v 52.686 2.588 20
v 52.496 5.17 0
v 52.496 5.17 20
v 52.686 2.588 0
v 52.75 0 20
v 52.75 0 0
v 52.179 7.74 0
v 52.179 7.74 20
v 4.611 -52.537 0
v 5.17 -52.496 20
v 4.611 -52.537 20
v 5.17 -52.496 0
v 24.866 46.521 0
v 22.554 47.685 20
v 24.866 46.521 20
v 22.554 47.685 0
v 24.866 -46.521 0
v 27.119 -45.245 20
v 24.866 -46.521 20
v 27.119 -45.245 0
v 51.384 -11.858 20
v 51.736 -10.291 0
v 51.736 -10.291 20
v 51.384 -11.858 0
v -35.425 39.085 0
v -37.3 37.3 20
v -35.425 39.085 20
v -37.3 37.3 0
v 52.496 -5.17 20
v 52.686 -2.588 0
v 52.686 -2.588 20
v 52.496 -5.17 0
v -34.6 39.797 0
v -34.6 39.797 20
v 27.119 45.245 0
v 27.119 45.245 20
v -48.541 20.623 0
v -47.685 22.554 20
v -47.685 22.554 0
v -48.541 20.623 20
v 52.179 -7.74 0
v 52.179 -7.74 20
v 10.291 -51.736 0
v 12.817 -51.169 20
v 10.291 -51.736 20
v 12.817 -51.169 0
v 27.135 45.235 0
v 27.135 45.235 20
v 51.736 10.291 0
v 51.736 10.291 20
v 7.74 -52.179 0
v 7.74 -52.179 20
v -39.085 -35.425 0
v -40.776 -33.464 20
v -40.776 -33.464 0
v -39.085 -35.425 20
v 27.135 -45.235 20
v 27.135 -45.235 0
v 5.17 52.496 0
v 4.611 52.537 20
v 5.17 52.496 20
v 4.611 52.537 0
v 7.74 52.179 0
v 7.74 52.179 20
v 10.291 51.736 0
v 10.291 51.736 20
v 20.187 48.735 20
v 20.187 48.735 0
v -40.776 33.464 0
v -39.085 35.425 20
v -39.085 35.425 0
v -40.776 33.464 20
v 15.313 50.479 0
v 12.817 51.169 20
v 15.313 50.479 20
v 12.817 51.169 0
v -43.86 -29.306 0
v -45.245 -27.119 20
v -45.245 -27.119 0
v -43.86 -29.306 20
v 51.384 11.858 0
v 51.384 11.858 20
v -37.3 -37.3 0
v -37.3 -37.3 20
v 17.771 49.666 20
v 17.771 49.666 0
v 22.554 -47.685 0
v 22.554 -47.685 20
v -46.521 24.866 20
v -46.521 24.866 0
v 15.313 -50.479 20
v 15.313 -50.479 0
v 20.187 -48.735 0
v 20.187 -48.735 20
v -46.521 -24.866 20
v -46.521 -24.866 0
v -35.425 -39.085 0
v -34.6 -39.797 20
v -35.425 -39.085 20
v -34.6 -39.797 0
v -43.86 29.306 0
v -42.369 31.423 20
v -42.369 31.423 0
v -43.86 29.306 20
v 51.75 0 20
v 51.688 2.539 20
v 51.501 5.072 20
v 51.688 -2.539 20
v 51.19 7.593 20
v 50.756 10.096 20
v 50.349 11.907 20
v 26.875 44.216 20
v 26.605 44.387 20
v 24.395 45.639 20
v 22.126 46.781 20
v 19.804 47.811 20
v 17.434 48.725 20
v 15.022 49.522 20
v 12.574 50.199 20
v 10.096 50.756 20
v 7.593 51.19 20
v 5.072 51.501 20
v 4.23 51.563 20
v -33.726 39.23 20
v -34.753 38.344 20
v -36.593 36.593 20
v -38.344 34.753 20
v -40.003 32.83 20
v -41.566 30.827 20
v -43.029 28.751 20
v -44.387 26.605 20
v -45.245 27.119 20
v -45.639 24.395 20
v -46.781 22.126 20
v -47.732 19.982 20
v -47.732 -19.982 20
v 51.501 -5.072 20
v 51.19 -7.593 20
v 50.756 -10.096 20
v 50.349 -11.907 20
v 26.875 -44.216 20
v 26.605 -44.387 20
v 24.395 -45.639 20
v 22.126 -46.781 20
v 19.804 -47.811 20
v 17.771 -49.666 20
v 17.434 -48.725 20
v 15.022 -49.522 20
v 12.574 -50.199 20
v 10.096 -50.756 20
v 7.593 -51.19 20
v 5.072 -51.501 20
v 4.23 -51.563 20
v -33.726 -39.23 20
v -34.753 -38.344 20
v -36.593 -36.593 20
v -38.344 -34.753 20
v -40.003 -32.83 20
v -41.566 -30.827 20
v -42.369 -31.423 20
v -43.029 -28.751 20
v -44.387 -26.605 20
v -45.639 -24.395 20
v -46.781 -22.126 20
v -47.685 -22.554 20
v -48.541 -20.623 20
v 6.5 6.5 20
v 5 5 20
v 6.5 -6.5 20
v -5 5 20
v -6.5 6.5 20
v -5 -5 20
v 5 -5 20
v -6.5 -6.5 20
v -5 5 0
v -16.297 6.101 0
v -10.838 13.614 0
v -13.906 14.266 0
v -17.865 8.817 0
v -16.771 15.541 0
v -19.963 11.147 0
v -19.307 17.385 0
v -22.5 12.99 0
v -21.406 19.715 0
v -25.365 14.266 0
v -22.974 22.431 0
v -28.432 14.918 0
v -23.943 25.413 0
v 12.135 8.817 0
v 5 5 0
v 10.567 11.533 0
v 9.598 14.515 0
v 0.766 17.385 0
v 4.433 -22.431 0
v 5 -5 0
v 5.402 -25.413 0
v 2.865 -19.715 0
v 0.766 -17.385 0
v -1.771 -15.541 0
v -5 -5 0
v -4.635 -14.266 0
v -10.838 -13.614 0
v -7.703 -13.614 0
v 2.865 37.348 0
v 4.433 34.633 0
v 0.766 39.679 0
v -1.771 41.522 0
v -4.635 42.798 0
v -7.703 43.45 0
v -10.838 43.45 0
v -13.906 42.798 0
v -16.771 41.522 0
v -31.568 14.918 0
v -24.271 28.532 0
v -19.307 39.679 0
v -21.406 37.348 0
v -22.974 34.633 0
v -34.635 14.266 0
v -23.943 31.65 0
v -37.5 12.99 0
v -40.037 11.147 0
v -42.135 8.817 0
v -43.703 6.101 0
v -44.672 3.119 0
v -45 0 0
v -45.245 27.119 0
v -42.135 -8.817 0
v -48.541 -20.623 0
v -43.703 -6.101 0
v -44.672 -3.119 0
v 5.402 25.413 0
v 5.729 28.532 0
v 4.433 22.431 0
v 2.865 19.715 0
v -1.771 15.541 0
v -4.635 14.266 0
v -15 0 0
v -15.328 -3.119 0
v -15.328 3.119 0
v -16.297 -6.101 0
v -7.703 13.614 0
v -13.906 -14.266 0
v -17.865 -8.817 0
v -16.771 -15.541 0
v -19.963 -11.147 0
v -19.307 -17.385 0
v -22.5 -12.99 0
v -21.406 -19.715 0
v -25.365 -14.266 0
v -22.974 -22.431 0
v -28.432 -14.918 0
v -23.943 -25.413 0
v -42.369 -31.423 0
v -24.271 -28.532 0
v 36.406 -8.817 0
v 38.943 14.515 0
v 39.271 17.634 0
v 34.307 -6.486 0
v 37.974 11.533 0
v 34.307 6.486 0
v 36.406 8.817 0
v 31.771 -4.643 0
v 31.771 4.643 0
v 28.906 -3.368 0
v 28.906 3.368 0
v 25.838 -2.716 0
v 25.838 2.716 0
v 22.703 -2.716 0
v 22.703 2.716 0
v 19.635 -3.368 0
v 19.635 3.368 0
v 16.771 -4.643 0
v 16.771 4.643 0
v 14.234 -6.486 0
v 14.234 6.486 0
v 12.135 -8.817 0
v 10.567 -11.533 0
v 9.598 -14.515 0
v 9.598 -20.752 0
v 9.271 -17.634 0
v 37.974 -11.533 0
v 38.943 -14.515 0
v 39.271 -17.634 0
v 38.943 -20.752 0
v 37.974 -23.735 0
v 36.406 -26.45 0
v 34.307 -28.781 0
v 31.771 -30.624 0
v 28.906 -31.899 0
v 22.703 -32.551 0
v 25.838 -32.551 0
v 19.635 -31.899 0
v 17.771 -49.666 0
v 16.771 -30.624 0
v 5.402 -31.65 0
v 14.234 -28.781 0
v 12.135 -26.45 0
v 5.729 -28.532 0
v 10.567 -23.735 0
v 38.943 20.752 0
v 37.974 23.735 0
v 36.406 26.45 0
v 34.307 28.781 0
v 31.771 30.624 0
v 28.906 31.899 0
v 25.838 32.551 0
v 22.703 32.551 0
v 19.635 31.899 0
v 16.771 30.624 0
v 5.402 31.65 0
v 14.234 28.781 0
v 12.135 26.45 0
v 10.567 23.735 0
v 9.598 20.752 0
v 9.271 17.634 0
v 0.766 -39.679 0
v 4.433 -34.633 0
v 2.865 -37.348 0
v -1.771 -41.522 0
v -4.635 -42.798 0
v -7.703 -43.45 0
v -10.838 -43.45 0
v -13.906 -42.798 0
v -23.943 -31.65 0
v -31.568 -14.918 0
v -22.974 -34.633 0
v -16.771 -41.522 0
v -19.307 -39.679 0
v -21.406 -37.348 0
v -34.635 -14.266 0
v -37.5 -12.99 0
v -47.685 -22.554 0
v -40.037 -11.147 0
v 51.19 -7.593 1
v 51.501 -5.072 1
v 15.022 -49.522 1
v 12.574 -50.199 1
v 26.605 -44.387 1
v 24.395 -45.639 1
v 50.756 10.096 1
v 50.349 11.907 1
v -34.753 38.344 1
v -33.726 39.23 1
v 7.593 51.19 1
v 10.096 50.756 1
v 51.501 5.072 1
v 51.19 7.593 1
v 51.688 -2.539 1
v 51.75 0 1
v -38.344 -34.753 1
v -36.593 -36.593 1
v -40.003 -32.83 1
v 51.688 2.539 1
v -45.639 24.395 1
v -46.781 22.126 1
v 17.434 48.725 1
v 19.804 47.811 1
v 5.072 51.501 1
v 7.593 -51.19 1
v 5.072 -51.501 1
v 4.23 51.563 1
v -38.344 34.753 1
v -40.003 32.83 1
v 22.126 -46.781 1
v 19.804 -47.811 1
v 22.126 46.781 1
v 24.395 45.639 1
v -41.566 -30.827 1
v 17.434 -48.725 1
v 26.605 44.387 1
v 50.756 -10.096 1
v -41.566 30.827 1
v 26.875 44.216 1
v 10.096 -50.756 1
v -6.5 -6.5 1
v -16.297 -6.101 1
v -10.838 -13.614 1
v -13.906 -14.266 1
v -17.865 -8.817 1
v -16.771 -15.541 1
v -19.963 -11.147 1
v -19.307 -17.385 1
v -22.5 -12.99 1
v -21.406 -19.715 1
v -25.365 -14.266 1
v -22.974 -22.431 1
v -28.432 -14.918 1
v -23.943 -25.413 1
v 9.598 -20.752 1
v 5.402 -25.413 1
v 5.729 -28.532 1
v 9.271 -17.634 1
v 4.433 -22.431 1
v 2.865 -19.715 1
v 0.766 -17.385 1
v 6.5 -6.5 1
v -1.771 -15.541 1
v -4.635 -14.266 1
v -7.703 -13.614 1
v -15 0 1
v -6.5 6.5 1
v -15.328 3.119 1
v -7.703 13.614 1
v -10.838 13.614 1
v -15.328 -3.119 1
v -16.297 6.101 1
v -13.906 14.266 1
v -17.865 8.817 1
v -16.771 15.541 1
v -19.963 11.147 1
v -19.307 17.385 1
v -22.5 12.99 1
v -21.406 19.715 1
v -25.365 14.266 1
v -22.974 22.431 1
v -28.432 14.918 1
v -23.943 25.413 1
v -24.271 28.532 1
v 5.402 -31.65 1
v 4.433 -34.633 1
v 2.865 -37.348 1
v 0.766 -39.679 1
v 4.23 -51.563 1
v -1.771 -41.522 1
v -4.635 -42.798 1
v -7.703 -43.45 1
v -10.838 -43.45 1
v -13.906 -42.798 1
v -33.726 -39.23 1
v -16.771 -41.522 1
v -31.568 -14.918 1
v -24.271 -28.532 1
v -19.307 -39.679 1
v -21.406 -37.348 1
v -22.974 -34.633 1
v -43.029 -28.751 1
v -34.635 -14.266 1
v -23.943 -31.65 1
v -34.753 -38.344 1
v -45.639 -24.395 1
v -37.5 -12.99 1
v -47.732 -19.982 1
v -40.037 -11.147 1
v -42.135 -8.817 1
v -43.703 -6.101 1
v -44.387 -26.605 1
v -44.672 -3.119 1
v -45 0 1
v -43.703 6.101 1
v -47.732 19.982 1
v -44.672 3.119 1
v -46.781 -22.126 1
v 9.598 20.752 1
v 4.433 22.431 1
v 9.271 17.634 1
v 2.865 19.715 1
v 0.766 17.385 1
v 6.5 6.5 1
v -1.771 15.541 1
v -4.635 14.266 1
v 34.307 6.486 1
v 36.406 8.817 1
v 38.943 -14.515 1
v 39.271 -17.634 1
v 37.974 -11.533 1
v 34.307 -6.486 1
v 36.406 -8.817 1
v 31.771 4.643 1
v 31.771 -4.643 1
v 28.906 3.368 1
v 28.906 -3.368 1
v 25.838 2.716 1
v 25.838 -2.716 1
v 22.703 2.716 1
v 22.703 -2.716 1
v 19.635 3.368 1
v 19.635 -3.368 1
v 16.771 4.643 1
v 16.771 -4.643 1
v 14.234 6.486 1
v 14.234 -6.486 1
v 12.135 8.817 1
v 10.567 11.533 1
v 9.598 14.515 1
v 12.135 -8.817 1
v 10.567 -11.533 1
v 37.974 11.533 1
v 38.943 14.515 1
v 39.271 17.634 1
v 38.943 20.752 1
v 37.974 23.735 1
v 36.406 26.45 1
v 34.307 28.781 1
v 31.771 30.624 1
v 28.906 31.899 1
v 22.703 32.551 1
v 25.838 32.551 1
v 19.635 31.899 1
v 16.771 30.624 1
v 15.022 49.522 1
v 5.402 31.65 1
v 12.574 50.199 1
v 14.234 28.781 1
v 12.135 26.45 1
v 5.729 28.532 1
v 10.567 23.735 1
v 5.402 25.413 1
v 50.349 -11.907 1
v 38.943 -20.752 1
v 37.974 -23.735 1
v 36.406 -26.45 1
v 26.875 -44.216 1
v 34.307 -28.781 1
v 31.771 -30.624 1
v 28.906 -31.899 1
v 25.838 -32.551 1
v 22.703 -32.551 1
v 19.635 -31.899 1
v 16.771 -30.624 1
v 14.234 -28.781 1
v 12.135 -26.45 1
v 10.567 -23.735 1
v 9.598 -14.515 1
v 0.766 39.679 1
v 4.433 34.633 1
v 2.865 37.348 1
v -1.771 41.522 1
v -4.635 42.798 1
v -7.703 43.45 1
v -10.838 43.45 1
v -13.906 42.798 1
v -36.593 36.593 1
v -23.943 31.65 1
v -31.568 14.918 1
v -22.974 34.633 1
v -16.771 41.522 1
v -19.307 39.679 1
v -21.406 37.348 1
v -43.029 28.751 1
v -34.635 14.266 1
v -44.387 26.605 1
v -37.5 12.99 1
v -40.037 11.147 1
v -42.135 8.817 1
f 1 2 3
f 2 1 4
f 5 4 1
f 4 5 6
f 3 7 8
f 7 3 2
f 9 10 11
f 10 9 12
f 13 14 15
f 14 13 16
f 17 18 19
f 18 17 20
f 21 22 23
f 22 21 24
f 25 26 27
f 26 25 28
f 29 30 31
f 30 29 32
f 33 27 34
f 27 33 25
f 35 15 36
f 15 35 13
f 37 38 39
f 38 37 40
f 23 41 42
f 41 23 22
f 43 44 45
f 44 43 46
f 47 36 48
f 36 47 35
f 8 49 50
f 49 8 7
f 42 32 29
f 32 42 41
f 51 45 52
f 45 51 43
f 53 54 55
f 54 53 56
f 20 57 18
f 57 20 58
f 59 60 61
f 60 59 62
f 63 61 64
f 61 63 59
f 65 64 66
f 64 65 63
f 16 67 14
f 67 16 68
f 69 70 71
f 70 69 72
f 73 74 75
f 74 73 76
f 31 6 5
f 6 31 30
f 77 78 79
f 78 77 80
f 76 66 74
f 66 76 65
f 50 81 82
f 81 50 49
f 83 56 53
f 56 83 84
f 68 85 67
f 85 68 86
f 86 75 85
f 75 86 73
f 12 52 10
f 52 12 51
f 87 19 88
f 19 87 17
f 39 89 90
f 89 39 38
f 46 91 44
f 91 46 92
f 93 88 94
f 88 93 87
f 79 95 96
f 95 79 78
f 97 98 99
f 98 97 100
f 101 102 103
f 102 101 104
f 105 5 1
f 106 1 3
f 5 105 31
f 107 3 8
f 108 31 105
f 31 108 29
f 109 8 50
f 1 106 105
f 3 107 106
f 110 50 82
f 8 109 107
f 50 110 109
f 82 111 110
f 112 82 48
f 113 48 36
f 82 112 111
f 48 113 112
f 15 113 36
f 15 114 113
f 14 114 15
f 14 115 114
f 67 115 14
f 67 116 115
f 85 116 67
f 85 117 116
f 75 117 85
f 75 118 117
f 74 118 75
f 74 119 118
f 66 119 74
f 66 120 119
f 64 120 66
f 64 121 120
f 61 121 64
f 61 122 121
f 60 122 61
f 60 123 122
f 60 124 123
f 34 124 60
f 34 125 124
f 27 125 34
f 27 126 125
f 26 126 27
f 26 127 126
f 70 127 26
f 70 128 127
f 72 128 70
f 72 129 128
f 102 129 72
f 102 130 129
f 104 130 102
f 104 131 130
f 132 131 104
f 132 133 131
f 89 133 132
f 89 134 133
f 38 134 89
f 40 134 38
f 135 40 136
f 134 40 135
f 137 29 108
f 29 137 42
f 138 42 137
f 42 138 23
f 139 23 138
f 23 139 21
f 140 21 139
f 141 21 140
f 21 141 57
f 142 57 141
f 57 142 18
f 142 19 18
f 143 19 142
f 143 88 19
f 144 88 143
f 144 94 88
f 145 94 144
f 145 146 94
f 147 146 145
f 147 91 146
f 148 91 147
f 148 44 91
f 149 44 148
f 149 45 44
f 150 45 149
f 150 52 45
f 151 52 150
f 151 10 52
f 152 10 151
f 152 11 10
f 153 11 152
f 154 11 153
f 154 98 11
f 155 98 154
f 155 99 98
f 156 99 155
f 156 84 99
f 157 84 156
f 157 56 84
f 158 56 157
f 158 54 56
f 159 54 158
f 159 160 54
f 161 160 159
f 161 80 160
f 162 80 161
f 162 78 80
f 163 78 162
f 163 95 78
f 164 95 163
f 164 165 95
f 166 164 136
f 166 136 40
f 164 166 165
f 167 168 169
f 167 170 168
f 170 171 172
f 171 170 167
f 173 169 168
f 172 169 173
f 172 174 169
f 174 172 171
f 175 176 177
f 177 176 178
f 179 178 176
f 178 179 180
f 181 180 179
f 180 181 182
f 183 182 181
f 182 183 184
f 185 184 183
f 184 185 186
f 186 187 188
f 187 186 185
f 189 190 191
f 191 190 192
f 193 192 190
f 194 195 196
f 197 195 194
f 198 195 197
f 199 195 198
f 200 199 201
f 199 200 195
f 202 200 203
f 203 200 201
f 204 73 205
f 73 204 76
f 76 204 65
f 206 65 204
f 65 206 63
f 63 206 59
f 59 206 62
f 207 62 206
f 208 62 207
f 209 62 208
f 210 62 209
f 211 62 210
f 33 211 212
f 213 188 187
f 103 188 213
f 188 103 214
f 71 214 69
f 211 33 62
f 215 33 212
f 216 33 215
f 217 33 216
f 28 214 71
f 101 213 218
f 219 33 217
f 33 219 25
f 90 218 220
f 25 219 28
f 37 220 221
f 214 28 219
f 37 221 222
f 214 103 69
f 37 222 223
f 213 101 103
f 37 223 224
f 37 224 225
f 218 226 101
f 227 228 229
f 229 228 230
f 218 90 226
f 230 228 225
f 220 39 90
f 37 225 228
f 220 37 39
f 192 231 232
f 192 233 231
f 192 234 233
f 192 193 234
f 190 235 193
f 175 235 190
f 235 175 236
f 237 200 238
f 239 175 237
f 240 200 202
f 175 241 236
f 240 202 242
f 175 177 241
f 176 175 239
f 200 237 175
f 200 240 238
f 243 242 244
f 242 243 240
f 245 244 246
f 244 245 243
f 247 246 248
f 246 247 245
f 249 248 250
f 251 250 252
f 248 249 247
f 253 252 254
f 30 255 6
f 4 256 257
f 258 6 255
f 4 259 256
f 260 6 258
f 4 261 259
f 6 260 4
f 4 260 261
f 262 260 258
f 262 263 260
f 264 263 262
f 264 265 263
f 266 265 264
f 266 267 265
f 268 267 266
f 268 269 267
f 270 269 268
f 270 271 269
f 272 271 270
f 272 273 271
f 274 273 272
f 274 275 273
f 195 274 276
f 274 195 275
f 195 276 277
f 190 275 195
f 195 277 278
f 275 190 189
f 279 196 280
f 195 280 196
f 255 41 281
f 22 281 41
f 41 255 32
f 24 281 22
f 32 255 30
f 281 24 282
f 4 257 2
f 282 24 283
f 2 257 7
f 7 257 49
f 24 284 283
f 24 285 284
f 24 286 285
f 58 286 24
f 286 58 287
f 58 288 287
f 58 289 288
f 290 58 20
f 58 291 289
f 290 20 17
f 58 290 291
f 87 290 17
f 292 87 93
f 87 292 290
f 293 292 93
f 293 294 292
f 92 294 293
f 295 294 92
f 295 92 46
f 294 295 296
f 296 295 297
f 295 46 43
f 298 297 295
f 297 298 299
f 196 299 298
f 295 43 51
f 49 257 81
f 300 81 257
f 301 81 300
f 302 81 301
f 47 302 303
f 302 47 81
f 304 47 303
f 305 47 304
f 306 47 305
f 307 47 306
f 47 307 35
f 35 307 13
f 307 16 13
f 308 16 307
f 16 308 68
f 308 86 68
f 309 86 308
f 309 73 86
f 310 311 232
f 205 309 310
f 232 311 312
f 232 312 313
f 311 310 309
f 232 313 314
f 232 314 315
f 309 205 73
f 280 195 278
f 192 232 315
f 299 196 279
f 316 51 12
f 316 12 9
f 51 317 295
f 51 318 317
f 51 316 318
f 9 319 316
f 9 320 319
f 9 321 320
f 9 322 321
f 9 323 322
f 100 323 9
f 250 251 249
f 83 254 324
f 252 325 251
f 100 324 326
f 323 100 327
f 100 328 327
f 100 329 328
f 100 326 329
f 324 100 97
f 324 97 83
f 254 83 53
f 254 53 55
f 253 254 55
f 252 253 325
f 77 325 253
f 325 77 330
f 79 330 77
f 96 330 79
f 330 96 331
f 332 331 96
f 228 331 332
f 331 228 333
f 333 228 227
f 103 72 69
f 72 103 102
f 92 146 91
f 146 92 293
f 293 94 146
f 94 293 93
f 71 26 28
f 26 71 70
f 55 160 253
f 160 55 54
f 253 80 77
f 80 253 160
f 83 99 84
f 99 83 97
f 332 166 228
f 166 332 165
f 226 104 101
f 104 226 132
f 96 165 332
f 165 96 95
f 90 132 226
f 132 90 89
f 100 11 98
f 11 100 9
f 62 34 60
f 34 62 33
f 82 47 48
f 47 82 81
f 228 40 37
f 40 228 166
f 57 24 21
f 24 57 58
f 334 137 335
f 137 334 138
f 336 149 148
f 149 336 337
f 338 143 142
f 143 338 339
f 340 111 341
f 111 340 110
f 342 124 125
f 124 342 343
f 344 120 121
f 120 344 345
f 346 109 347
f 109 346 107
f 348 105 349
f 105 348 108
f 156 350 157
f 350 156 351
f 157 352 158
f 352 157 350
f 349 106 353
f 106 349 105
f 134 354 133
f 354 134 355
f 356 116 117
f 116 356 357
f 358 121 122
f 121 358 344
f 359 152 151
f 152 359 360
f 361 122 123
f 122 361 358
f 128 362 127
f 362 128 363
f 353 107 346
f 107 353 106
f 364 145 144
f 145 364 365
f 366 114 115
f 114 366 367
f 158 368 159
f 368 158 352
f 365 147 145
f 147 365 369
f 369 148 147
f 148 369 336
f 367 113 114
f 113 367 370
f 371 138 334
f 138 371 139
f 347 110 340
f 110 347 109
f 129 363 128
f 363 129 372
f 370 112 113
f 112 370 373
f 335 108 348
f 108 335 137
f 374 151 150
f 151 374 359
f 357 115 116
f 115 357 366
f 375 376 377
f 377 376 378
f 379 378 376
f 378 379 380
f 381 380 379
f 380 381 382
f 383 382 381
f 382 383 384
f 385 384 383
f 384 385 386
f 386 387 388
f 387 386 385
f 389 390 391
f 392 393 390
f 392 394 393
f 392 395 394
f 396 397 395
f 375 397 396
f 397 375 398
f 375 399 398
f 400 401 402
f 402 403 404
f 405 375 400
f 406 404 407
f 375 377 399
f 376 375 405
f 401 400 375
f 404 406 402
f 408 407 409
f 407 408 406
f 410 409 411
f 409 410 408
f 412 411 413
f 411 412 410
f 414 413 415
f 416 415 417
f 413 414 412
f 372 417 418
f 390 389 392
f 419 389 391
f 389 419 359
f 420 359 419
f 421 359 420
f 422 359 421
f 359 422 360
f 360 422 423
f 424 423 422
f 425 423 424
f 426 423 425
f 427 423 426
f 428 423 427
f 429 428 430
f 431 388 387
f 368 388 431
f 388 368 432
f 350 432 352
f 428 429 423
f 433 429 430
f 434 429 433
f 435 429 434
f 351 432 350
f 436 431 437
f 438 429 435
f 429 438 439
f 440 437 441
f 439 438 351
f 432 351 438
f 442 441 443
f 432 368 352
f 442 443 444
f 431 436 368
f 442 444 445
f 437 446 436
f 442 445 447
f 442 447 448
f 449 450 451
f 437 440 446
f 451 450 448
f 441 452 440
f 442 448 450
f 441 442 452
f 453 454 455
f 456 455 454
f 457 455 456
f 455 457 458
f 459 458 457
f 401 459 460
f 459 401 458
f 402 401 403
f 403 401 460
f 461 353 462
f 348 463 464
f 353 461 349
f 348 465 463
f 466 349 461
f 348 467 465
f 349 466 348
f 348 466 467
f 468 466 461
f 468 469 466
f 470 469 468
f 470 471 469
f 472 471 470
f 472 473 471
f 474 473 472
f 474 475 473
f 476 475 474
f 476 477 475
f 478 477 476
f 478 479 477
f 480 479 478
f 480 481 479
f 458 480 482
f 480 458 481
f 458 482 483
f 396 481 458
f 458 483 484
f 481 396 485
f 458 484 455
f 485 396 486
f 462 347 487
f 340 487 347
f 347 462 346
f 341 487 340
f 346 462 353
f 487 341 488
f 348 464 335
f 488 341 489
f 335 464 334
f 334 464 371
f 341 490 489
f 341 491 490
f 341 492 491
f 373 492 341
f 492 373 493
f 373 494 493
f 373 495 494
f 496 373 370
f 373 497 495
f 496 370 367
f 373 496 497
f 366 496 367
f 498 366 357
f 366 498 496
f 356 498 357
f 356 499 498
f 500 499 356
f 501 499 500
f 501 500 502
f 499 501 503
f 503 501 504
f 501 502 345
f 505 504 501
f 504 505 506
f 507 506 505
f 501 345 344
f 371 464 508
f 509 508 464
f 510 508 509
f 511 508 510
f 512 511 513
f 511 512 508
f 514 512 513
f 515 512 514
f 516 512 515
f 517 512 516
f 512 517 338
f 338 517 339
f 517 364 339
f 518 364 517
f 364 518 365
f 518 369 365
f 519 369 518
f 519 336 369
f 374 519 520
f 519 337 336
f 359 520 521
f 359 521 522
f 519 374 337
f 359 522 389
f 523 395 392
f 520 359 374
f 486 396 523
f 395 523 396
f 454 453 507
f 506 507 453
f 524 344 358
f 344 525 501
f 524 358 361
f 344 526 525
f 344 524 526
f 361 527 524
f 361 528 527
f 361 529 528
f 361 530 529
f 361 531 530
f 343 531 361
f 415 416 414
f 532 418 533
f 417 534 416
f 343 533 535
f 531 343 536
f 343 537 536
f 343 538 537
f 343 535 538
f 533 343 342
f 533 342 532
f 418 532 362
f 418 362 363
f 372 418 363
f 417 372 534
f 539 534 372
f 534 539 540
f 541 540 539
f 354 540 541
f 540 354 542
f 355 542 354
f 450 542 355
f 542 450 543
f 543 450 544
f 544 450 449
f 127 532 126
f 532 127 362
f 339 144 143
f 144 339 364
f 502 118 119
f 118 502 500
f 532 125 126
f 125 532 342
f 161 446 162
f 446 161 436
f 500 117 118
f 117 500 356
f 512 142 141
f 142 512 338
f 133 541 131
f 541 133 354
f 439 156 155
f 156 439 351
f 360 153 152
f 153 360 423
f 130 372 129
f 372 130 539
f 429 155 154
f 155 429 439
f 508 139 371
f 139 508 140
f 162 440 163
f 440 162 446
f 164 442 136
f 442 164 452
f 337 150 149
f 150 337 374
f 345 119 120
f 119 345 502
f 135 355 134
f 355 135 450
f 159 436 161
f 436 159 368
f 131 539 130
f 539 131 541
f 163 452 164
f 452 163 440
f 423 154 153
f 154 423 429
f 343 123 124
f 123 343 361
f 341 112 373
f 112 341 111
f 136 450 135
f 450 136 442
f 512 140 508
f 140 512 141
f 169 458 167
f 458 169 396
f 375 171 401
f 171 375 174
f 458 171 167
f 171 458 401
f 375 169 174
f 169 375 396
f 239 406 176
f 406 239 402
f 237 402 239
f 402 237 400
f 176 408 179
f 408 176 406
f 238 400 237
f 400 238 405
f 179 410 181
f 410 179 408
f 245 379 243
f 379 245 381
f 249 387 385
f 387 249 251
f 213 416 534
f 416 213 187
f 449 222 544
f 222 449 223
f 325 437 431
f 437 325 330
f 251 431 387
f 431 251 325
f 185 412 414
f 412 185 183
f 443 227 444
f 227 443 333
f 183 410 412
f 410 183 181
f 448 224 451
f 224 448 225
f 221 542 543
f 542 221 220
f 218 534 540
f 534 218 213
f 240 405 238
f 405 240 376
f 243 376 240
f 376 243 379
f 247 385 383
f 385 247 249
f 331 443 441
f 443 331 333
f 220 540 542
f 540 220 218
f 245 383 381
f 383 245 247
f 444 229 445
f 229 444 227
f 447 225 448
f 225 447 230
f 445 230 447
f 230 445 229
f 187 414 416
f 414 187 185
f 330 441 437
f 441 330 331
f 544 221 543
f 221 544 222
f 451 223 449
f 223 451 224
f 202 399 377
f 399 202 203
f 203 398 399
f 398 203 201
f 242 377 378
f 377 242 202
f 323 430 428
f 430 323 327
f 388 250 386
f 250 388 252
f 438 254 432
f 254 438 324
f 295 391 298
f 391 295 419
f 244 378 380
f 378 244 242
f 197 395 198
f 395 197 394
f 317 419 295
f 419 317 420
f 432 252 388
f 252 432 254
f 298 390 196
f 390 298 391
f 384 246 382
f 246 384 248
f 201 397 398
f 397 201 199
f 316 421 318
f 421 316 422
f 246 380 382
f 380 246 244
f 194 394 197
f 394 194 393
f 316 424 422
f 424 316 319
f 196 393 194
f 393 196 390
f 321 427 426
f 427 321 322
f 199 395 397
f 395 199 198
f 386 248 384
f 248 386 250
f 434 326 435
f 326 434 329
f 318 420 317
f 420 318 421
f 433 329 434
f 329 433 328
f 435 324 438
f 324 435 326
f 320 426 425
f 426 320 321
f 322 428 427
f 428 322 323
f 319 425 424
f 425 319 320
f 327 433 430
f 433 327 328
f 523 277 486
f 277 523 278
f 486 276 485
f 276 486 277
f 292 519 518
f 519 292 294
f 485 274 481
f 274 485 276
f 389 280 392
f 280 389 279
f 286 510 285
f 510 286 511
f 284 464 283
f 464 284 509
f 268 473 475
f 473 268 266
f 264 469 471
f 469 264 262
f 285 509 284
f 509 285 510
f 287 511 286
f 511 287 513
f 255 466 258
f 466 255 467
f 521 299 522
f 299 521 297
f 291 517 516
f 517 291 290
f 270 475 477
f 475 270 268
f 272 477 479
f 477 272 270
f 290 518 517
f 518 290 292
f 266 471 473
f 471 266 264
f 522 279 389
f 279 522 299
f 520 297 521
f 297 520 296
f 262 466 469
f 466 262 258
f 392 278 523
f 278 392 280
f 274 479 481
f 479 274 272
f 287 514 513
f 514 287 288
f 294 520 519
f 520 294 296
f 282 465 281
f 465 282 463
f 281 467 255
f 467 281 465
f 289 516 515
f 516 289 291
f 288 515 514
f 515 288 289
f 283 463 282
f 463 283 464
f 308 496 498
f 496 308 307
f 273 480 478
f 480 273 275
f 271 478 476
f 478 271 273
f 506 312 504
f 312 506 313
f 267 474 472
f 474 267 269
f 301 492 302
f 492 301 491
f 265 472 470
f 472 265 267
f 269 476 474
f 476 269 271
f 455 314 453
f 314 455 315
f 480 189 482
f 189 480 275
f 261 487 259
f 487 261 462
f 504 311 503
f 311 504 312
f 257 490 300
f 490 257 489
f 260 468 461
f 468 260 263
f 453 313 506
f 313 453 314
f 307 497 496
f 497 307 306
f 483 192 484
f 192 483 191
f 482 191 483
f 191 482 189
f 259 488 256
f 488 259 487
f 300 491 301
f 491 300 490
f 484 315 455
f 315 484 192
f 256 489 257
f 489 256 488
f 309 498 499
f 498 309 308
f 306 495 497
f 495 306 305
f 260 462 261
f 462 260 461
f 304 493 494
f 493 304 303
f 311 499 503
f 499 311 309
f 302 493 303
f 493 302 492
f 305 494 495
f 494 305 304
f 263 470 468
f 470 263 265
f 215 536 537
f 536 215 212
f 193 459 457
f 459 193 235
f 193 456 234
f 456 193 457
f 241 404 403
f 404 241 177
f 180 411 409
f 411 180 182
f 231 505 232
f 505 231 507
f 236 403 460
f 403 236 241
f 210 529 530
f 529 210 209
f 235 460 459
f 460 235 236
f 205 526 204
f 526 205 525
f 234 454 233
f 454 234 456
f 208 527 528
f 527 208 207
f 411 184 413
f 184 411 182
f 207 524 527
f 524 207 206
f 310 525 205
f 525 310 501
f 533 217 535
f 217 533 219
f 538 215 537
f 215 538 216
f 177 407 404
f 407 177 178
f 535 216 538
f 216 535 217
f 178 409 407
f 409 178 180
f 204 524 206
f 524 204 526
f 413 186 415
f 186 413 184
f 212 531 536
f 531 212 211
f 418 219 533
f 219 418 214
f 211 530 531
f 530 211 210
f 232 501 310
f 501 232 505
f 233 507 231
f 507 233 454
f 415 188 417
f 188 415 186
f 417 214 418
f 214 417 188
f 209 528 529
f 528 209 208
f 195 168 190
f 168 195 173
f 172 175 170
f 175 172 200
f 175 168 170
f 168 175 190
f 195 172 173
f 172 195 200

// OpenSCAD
difference(){
    intersection(){
        cylinder(d=105.5, h=20, $fn=128);
        cylinder(d=120,   h=20, $fn=5);
    }
    cube([10,10,50], center=true);
    translate([0,0,1])
    difference(){
        
        intersection(){
            cylinder(d=105.5-2, h=20, $fn=128);
            cylinder(d=120-2,   h=20, $fn=5);
        }
        cube([13,13,50], center=true);
    }
    for(i=[0:72:360])
        rotate([0,0,i])
            translate([-30,0,0])
                cylinder(d=30, h=50, center=true);
}
